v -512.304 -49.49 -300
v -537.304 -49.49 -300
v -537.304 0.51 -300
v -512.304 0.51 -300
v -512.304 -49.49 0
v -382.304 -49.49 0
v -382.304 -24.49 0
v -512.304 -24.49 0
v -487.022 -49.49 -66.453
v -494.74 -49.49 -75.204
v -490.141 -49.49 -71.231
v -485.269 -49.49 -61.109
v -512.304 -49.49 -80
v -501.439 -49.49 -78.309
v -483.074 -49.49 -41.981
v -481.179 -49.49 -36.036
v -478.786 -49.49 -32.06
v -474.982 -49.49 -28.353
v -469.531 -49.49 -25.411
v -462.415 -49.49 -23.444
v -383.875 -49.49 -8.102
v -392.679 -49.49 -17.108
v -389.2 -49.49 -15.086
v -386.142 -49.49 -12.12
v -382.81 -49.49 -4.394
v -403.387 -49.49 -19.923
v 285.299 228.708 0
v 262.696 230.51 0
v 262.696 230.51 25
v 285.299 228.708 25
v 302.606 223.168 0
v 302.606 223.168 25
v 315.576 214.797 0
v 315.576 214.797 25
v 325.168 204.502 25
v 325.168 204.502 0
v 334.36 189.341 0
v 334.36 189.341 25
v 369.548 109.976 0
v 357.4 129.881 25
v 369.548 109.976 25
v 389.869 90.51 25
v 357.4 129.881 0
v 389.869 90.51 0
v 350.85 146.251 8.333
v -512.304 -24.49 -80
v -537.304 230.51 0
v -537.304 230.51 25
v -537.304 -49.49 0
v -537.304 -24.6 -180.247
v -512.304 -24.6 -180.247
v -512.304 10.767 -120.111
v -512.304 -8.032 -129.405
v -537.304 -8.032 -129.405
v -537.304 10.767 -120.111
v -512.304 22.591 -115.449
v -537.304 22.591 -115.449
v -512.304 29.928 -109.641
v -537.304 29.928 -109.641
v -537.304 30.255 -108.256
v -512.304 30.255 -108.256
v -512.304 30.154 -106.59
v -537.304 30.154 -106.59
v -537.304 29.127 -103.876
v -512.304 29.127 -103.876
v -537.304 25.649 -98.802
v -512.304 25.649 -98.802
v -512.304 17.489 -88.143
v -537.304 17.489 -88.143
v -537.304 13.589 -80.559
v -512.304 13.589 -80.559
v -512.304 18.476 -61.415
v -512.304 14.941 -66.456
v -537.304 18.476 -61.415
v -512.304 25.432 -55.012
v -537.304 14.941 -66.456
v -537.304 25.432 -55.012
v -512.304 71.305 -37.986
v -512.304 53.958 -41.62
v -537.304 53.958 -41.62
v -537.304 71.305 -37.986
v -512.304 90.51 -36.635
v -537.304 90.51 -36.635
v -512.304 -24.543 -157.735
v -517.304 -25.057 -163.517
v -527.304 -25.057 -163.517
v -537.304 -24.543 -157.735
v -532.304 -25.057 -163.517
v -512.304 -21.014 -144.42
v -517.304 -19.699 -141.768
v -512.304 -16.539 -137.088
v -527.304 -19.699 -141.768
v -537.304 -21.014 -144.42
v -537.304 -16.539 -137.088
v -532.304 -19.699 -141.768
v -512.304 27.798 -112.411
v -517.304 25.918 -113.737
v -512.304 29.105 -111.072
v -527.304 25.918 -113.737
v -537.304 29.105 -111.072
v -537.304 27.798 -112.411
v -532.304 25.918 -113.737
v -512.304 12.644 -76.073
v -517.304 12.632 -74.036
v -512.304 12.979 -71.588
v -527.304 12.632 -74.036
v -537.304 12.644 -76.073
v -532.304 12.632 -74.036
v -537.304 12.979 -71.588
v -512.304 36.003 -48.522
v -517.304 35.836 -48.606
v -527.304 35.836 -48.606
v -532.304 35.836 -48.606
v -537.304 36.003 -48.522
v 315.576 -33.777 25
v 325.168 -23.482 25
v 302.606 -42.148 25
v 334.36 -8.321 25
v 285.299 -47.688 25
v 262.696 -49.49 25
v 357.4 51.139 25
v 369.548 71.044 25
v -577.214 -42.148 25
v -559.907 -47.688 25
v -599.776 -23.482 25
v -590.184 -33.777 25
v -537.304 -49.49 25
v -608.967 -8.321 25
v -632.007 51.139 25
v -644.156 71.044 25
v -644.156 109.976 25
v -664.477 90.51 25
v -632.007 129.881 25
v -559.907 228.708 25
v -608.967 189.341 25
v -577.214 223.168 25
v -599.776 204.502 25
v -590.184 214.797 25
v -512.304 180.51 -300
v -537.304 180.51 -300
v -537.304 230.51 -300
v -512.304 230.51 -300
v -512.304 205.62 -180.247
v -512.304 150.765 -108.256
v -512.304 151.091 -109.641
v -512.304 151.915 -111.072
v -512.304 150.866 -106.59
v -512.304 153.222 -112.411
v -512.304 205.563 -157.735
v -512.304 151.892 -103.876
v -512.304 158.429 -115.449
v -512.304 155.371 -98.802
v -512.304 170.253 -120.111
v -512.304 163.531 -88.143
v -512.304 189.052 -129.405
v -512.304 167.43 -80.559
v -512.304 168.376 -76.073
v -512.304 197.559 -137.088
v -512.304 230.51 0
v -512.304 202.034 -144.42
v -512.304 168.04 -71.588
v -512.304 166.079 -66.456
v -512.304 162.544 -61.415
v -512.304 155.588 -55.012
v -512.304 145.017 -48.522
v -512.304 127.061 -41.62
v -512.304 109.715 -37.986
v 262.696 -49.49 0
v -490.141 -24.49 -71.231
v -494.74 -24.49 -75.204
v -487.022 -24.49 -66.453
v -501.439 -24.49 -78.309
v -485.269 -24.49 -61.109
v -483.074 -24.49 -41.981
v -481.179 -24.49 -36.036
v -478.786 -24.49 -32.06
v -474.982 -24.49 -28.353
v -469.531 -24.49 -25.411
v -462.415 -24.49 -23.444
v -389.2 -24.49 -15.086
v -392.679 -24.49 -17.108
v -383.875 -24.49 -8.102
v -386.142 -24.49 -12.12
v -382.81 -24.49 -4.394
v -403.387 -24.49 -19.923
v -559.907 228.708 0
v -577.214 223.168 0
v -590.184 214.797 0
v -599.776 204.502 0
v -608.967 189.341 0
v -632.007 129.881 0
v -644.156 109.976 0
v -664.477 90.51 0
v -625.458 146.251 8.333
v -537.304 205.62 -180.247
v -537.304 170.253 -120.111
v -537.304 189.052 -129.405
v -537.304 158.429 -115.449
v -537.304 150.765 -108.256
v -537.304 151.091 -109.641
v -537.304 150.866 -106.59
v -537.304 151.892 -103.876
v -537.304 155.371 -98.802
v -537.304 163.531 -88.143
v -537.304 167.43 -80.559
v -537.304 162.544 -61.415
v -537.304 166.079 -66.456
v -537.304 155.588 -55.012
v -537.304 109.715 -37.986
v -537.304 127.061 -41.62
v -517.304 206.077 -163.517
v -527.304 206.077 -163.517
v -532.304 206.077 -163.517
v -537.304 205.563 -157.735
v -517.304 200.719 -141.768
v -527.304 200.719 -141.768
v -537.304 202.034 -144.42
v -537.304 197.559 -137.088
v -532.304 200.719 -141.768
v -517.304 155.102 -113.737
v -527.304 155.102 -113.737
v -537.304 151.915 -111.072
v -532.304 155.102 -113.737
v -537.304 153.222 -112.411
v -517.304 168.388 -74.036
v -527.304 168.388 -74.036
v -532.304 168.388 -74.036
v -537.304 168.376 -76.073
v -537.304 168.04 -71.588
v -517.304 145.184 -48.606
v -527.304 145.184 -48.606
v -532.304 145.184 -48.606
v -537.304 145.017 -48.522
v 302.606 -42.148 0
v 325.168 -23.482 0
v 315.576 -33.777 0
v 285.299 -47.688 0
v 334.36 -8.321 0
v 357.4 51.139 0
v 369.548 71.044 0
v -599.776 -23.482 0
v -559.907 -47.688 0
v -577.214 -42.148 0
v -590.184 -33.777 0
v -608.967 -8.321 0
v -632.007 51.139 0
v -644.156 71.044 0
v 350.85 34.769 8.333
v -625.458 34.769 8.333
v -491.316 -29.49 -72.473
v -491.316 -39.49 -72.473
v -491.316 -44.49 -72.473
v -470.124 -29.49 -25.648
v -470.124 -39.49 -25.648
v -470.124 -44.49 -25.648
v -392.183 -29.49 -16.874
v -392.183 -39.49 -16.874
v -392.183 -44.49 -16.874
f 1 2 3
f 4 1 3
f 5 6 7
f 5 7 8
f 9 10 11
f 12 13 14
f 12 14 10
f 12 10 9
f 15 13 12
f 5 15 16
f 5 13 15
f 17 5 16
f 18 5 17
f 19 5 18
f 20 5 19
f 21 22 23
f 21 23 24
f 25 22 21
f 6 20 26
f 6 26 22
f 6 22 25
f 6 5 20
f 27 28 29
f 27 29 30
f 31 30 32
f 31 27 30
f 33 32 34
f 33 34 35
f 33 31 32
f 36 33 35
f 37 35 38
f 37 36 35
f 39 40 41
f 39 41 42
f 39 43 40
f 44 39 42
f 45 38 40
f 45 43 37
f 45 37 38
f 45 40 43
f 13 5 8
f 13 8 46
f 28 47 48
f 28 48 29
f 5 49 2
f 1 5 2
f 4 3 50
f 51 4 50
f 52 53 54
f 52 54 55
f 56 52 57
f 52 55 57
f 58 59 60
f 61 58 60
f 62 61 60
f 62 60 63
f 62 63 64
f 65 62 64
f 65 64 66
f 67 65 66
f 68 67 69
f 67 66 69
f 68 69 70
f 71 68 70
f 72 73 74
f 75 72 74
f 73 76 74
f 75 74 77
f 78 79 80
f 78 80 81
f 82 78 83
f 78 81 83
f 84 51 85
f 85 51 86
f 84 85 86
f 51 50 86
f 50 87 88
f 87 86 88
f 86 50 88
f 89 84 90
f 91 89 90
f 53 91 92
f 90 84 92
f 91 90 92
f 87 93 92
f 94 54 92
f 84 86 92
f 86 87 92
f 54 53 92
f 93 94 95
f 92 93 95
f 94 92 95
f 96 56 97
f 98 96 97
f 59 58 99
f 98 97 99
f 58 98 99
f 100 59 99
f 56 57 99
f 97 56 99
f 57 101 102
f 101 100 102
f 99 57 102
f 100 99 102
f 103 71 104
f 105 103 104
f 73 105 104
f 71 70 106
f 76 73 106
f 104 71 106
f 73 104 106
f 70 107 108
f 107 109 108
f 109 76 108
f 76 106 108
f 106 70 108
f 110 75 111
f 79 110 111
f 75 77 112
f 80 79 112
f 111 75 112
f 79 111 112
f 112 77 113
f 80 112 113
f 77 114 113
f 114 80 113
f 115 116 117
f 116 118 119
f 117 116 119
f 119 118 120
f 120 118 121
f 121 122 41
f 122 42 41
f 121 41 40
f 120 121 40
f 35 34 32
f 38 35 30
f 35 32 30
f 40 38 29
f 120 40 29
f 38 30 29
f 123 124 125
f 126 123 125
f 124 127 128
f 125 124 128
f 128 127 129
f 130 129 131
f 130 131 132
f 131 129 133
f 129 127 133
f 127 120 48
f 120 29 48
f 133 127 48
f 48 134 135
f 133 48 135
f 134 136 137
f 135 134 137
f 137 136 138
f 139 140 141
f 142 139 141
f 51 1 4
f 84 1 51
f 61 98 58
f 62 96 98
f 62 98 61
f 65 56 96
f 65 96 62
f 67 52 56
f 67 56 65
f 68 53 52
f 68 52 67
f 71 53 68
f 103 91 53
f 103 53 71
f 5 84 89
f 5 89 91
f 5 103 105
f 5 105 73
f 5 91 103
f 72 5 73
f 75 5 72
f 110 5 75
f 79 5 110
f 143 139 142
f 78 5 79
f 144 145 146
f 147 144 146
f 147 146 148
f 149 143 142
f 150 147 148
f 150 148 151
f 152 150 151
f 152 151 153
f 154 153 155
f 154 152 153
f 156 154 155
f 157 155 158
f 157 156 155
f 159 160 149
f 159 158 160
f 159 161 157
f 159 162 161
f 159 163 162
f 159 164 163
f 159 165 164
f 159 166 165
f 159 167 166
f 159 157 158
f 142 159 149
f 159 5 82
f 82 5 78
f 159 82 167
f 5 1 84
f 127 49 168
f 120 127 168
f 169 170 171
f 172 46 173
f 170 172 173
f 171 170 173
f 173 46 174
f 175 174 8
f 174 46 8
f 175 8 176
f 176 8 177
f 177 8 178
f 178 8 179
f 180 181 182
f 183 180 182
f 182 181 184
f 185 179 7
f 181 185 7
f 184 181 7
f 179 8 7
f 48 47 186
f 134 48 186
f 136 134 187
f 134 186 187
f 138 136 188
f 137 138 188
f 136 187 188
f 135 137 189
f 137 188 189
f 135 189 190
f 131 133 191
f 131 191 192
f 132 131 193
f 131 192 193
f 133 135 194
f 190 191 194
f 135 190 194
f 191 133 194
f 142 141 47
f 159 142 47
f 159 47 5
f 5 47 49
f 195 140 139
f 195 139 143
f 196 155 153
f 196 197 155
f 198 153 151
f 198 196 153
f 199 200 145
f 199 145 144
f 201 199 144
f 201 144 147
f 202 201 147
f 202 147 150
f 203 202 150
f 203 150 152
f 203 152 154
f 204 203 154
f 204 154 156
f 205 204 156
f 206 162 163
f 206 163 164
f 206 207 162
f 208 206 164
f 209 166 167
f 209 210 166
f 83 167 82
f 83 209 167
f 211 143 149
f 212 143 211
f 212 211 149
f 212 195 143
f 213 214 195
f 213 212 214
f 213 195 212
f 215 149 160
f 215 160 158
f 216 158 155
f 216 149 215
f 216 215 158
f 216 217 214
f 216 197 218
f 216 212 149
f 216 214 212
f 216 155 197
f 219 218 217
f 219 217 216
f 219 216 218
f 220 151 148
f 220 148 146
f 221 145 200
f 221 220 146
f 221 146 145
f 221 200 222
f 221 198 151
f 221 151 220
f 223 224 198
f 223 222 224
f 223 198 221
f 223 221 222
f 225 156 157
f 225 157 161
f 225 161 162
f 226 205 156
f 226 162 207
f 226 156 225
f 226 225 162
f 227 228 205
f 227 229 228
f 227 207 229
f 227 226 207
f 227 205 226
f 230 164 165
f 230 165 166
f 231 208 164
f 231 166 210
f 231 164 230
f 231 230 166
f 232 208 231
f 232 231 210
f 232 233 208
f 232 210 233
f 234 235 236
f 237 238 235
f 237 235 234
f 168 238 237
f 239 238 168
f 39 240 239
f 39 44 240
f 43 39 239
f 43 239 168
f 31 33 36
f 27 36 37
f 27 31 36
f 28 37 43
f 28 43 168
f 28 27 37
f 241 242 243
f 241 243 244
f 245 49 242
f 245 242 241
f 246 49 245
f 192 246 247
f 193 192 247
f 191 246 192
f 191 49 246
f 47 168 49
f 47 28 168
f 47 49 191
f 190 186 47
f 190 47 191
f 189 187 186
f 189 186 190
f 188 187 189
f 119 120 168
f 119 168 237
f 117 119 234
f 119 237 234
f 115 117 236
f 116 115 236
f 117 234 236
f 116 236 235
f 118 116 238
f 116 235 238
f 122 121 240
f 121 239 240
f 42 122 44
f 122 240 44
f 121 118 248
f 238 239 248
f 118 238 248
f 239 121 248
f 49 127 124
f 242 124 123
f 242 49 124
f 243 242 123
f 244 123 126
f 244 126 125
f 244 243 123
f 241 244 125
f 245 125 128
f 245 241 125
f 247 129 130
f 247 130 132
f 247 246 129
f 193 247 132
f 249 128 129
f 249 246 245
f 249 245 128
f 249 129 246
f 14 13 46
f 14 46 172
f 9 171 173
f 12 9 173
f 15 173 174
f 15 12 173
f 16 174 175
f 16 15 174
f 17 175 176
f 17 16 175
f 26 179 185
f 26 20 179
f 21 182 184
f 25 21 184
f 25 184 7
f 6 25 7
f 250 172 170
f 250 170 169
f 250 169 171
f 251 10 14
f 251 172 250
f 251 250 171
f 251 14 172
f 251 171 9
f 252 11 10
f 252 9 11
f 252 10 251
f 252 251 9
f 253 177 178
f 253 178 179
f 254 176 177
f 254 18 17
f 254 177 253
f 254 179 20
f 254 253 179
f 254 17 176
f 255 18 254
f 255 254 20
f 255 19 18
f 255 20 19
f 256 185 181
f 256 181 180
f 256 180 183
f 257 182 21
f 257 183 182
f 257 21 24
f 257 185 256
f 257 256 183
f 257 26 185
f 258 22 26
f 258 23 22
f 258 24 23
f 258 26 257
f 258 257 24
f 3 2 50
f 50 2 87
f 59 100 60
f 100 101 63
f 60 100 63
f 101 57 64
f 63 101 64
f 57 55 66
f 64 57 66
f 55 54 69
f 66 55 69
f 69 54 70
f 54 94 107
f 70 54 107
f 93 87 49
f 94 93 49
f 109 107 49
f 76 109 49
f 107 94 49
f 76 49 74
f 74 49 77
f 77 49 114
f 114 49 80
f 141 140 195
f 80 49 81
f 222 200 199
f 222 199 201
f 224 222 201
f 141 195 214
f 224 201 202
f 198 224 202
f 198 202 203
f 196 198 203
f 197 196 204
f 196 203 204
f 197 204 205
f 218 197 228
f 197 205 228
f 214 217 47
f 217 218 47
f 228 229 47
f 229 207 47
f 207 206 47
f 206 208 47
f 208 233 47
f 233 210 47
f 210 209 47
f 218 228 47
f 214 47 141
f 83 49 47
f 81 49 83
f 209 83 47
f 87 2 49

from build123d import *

# Parameters (mm, degrees)
F0_W     = 800
F0_H     = 280
F3_DEPTH = 25
F4_DEPTH = 25
F6_DEPTH = 25


with BuildPart() as f3:
    # F0 (on Top) → F3 (new body)
    with BuildSketch(Plane.XY):
        with BuildLine():
            add(Edge.make_bspline(
                [(-537.303840369, -49.4900339842), (-579.8237086489, -50.1027958958), (-609.6719073908, -16.522082834), (-624.9544376815, 36.8734544523), (-640.3220891953, 72.548866272), (-664.4766926765, 90.5099660158)],
                knots=[0, 0, 0, 0, 0.3663506071, 0.6597682426, 1, 1, 1, 1], degree=3))
            Line((-537.303840369, -49.4900339842), (-537.303840369, 230.5099660158))
            add(Edge.make_bspline(
                [(-537.303840369, 230.5099660158), (-579.8237086489, 231.1227279275), (-609.6719073908, 197.5420148656), (-624.9544376815, 144.1464775793), (-640.3220891953, 108.4710657597), (-664.4766926765, 90.5099660158)],
                knots=[0, 0, 0, 0, 0.3663506071, 0.6597682426, 1, 1, 1, 1], degree=3))
        make_face()
        with Locations((-137.303840369, 90.5099660158)):
            Rectangle(F0_W, F0_H)
        with BuildLine():
            Line((262.696159631, 230.5099660158), (262.696159631, -49.4900339842))
            add(Edge.make_bspline(
                [(262.696159631, -49.4900339842), (305.216027911, -50.1027958958), (335.0642266528, -16.522082834), (350.3467569436, 36.8734544523), (365.7144084573, 72.548866272), (389.8690119386, 90.5099660158)],
                knots=[0, 0, 0, 0, 0.3663506071, 0.6597682426, 1, 1, 1, 1], degree=3))
            add(Edge.make_bspline(
                [(262.696159631, 230.5099660158), (305.216027911, 231.1227279275), (335.0642266528, 197.5420148656), (350.3467569436, 144.1464775793), (365.7144084573, 108.4710657597), (389.8690119386, 90.5099660158)],
                knots=[0, 0, 0, 0, 0.3663506071, 0.6597682426, 1, 1, 1, 1], degree=3))
        make_face()
    extrude(amount=F3_DEPTH)


with BuildPart() as f4:
    # F2 (on plane+point) → F4 (new body)
    with BuildSketch(Plane.YZ.offset(-537.303840369)):
        with BuildLine():
            Line((230.5099660158, -300), (230.5099660158, 0))
            Line((230.5099660158, 0), (-49.4900339842, 0))
            Line((-49.4900339842, 0), (-49.4900339842, -300))
            Line((-49.4900339842, -300), (0.5099660158, -300))
            add(Edge.make_bspline(
                [(0.5099660158, -300), (-11.936796864, -235.0211868442), (-51.4268977409, -131.012674632), (27.1782230132, -117.6112629536), (33.5489318103, -103.3366036281), (-8.957260291, -69.2195325533), (46.5764747456, -36.770094018), (90.5099660158, -36.6349332035)],
                knots=[0, 0, 0, 0, 0.3327719638, 0.5209657604, 0.6028276022, 0.7557421537, 1, 1, 1, 1], degree=3))
            add(Edge.make_bspline(
                [(180.5099660158, -300), (192.9567288956, -235.0211868442), (232.4468297725, -131.012674632), (153.8417090184, -117.6112629536), (147.4710002213, -103.3366036281), (189.9771923226, -69.2195325533), (134.443457286, -36.770094018), (90.5099660158, -36.6349332035)],
                knots=[0, 0, 0, 0, 0.3327719638, 0.5209657604, 0.6028276022, 0.7557421537, 1, 1, 1, 1], degree=3))
            Line((180.5099660158, -300), (230.5099660158, -300))
        make_face()
    extrude(amount=F4_DEPTH)


with BuildPart() as f6:
    # F5 (on face) → F6 (new body)
    with BuildSketch(Plane.XZ.offset(49.4900339842)):
        with BuildLine():
            add(Edge.make_bspline(
                [(-512.303840369, -80), (-498.2817289761, -79.6210311629), (-482.7649829726, -68.2648291492), (-485.4320171379, -42.2525797623), (-472.7313877784, -18.0340160913), (-405.5308137942, -24.3615889417), (-382.9815961956, -14.855474635), (-382.303840369, 0)],
                knots=[0, 0, 0, 0, 0.1899446525, 0.3589877103, 0.522290711, 0.803499517, 1, 1, 1, 1], degree=3))
            Line((-382.303840369, 0), (-512.303840369, 0))
            Line((-512.303840369, 0), (-512.303840369, -80))
        make_face()
    extrude(amount=-F6_DEPTH)


solid = Compound([f3.part, f4.part, f6.part])
